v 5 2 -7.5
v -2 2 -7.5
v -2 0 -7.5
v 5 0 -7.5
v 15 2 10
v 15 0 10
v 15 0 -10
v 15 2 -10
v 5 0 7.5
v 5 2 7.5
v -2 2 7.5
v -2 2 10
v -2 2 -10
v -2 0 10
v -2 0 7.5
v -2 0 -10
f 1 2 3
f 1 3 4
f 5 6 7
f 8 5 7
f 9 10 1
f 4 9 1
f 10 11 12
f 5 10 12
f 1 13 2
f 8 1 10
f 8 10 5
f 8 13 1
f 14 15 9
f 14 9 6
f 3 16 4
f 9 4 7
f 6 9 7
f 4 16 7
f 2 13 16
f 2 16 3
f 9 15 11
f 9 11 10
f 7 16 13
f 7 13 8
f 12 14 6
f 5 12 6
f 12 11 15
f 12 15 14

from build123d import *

# Parameters (mm, degrees)
SKETCH1_W           = 19
SKETCH1_H           = 20
SKETCH1_W_2         = 2
SKETCH1_H_2         = 5
BOSS_EXTRUDE1_DEPTH = 2
SKETCH2_W           = 5
SKETCH2_H           = 15
CUT_EXTRUDE1_DEPTH  = 10
CUT_EXTRUDE3_DEPTH  = 10


with BuildPart() as part:
    # Sketch1 → Boss-Extrude1 (new body)
    with BuildSketch(Plane(origin=(0, 0, 0), x_dir=(1, 0, 0), z_dir=(0, 1, 0))):
        with Locations((5.5, 0)):
            Rectangle(SKETCH1_W, SKETCH1_H)
        with Locations((-1, 5)):
            Rectangle(SKETCH1_W_2, SKETCH1_H_2, mode=Mode.SUBTRACT)
        with Locations((-1, -5)):
            Rectangle(SKETCH1_W_2, SKETCH1_H_2, mode=Mode.SUBTRACT)
    extrude(amount=BOSS_EXTRUDE1_DEPTH)

    # Sketch2 → Cut-Extrude1 (cut)
    with BuildSketch(Plane(origin=(0, 2, 0), x_dir=(1, 0, 0), z_dir=(0, 1, 0))):
        with Locations((2.5, 0)):
            Rectangle(SKETCH2_W, SKETCH2_H)
    extrude(amount=-CUT_EXTRUDE1_DEPTH, mode=Mode.SUBTRACT)

    # Sketch3 → Cut-Extrude3 (cut)
    with BuildSketch(Plane(origin=(0, 2, 0), x_dir=(1, 0, 0), z_dir=(0, 1, 0))):
        Polygon((-4, 10), (-2, 10), (-2, 3.892371719), (1.539535597, 3.892371719), (1.539535597, -3.189870508), (-2, -3.189870508), (-2, -10), (-4, -10), align=None)
    extrude(amount=-CUT_EXTRUDE3_DEPTH, mode=Mode.SUBTRACT)


solid = part.part
